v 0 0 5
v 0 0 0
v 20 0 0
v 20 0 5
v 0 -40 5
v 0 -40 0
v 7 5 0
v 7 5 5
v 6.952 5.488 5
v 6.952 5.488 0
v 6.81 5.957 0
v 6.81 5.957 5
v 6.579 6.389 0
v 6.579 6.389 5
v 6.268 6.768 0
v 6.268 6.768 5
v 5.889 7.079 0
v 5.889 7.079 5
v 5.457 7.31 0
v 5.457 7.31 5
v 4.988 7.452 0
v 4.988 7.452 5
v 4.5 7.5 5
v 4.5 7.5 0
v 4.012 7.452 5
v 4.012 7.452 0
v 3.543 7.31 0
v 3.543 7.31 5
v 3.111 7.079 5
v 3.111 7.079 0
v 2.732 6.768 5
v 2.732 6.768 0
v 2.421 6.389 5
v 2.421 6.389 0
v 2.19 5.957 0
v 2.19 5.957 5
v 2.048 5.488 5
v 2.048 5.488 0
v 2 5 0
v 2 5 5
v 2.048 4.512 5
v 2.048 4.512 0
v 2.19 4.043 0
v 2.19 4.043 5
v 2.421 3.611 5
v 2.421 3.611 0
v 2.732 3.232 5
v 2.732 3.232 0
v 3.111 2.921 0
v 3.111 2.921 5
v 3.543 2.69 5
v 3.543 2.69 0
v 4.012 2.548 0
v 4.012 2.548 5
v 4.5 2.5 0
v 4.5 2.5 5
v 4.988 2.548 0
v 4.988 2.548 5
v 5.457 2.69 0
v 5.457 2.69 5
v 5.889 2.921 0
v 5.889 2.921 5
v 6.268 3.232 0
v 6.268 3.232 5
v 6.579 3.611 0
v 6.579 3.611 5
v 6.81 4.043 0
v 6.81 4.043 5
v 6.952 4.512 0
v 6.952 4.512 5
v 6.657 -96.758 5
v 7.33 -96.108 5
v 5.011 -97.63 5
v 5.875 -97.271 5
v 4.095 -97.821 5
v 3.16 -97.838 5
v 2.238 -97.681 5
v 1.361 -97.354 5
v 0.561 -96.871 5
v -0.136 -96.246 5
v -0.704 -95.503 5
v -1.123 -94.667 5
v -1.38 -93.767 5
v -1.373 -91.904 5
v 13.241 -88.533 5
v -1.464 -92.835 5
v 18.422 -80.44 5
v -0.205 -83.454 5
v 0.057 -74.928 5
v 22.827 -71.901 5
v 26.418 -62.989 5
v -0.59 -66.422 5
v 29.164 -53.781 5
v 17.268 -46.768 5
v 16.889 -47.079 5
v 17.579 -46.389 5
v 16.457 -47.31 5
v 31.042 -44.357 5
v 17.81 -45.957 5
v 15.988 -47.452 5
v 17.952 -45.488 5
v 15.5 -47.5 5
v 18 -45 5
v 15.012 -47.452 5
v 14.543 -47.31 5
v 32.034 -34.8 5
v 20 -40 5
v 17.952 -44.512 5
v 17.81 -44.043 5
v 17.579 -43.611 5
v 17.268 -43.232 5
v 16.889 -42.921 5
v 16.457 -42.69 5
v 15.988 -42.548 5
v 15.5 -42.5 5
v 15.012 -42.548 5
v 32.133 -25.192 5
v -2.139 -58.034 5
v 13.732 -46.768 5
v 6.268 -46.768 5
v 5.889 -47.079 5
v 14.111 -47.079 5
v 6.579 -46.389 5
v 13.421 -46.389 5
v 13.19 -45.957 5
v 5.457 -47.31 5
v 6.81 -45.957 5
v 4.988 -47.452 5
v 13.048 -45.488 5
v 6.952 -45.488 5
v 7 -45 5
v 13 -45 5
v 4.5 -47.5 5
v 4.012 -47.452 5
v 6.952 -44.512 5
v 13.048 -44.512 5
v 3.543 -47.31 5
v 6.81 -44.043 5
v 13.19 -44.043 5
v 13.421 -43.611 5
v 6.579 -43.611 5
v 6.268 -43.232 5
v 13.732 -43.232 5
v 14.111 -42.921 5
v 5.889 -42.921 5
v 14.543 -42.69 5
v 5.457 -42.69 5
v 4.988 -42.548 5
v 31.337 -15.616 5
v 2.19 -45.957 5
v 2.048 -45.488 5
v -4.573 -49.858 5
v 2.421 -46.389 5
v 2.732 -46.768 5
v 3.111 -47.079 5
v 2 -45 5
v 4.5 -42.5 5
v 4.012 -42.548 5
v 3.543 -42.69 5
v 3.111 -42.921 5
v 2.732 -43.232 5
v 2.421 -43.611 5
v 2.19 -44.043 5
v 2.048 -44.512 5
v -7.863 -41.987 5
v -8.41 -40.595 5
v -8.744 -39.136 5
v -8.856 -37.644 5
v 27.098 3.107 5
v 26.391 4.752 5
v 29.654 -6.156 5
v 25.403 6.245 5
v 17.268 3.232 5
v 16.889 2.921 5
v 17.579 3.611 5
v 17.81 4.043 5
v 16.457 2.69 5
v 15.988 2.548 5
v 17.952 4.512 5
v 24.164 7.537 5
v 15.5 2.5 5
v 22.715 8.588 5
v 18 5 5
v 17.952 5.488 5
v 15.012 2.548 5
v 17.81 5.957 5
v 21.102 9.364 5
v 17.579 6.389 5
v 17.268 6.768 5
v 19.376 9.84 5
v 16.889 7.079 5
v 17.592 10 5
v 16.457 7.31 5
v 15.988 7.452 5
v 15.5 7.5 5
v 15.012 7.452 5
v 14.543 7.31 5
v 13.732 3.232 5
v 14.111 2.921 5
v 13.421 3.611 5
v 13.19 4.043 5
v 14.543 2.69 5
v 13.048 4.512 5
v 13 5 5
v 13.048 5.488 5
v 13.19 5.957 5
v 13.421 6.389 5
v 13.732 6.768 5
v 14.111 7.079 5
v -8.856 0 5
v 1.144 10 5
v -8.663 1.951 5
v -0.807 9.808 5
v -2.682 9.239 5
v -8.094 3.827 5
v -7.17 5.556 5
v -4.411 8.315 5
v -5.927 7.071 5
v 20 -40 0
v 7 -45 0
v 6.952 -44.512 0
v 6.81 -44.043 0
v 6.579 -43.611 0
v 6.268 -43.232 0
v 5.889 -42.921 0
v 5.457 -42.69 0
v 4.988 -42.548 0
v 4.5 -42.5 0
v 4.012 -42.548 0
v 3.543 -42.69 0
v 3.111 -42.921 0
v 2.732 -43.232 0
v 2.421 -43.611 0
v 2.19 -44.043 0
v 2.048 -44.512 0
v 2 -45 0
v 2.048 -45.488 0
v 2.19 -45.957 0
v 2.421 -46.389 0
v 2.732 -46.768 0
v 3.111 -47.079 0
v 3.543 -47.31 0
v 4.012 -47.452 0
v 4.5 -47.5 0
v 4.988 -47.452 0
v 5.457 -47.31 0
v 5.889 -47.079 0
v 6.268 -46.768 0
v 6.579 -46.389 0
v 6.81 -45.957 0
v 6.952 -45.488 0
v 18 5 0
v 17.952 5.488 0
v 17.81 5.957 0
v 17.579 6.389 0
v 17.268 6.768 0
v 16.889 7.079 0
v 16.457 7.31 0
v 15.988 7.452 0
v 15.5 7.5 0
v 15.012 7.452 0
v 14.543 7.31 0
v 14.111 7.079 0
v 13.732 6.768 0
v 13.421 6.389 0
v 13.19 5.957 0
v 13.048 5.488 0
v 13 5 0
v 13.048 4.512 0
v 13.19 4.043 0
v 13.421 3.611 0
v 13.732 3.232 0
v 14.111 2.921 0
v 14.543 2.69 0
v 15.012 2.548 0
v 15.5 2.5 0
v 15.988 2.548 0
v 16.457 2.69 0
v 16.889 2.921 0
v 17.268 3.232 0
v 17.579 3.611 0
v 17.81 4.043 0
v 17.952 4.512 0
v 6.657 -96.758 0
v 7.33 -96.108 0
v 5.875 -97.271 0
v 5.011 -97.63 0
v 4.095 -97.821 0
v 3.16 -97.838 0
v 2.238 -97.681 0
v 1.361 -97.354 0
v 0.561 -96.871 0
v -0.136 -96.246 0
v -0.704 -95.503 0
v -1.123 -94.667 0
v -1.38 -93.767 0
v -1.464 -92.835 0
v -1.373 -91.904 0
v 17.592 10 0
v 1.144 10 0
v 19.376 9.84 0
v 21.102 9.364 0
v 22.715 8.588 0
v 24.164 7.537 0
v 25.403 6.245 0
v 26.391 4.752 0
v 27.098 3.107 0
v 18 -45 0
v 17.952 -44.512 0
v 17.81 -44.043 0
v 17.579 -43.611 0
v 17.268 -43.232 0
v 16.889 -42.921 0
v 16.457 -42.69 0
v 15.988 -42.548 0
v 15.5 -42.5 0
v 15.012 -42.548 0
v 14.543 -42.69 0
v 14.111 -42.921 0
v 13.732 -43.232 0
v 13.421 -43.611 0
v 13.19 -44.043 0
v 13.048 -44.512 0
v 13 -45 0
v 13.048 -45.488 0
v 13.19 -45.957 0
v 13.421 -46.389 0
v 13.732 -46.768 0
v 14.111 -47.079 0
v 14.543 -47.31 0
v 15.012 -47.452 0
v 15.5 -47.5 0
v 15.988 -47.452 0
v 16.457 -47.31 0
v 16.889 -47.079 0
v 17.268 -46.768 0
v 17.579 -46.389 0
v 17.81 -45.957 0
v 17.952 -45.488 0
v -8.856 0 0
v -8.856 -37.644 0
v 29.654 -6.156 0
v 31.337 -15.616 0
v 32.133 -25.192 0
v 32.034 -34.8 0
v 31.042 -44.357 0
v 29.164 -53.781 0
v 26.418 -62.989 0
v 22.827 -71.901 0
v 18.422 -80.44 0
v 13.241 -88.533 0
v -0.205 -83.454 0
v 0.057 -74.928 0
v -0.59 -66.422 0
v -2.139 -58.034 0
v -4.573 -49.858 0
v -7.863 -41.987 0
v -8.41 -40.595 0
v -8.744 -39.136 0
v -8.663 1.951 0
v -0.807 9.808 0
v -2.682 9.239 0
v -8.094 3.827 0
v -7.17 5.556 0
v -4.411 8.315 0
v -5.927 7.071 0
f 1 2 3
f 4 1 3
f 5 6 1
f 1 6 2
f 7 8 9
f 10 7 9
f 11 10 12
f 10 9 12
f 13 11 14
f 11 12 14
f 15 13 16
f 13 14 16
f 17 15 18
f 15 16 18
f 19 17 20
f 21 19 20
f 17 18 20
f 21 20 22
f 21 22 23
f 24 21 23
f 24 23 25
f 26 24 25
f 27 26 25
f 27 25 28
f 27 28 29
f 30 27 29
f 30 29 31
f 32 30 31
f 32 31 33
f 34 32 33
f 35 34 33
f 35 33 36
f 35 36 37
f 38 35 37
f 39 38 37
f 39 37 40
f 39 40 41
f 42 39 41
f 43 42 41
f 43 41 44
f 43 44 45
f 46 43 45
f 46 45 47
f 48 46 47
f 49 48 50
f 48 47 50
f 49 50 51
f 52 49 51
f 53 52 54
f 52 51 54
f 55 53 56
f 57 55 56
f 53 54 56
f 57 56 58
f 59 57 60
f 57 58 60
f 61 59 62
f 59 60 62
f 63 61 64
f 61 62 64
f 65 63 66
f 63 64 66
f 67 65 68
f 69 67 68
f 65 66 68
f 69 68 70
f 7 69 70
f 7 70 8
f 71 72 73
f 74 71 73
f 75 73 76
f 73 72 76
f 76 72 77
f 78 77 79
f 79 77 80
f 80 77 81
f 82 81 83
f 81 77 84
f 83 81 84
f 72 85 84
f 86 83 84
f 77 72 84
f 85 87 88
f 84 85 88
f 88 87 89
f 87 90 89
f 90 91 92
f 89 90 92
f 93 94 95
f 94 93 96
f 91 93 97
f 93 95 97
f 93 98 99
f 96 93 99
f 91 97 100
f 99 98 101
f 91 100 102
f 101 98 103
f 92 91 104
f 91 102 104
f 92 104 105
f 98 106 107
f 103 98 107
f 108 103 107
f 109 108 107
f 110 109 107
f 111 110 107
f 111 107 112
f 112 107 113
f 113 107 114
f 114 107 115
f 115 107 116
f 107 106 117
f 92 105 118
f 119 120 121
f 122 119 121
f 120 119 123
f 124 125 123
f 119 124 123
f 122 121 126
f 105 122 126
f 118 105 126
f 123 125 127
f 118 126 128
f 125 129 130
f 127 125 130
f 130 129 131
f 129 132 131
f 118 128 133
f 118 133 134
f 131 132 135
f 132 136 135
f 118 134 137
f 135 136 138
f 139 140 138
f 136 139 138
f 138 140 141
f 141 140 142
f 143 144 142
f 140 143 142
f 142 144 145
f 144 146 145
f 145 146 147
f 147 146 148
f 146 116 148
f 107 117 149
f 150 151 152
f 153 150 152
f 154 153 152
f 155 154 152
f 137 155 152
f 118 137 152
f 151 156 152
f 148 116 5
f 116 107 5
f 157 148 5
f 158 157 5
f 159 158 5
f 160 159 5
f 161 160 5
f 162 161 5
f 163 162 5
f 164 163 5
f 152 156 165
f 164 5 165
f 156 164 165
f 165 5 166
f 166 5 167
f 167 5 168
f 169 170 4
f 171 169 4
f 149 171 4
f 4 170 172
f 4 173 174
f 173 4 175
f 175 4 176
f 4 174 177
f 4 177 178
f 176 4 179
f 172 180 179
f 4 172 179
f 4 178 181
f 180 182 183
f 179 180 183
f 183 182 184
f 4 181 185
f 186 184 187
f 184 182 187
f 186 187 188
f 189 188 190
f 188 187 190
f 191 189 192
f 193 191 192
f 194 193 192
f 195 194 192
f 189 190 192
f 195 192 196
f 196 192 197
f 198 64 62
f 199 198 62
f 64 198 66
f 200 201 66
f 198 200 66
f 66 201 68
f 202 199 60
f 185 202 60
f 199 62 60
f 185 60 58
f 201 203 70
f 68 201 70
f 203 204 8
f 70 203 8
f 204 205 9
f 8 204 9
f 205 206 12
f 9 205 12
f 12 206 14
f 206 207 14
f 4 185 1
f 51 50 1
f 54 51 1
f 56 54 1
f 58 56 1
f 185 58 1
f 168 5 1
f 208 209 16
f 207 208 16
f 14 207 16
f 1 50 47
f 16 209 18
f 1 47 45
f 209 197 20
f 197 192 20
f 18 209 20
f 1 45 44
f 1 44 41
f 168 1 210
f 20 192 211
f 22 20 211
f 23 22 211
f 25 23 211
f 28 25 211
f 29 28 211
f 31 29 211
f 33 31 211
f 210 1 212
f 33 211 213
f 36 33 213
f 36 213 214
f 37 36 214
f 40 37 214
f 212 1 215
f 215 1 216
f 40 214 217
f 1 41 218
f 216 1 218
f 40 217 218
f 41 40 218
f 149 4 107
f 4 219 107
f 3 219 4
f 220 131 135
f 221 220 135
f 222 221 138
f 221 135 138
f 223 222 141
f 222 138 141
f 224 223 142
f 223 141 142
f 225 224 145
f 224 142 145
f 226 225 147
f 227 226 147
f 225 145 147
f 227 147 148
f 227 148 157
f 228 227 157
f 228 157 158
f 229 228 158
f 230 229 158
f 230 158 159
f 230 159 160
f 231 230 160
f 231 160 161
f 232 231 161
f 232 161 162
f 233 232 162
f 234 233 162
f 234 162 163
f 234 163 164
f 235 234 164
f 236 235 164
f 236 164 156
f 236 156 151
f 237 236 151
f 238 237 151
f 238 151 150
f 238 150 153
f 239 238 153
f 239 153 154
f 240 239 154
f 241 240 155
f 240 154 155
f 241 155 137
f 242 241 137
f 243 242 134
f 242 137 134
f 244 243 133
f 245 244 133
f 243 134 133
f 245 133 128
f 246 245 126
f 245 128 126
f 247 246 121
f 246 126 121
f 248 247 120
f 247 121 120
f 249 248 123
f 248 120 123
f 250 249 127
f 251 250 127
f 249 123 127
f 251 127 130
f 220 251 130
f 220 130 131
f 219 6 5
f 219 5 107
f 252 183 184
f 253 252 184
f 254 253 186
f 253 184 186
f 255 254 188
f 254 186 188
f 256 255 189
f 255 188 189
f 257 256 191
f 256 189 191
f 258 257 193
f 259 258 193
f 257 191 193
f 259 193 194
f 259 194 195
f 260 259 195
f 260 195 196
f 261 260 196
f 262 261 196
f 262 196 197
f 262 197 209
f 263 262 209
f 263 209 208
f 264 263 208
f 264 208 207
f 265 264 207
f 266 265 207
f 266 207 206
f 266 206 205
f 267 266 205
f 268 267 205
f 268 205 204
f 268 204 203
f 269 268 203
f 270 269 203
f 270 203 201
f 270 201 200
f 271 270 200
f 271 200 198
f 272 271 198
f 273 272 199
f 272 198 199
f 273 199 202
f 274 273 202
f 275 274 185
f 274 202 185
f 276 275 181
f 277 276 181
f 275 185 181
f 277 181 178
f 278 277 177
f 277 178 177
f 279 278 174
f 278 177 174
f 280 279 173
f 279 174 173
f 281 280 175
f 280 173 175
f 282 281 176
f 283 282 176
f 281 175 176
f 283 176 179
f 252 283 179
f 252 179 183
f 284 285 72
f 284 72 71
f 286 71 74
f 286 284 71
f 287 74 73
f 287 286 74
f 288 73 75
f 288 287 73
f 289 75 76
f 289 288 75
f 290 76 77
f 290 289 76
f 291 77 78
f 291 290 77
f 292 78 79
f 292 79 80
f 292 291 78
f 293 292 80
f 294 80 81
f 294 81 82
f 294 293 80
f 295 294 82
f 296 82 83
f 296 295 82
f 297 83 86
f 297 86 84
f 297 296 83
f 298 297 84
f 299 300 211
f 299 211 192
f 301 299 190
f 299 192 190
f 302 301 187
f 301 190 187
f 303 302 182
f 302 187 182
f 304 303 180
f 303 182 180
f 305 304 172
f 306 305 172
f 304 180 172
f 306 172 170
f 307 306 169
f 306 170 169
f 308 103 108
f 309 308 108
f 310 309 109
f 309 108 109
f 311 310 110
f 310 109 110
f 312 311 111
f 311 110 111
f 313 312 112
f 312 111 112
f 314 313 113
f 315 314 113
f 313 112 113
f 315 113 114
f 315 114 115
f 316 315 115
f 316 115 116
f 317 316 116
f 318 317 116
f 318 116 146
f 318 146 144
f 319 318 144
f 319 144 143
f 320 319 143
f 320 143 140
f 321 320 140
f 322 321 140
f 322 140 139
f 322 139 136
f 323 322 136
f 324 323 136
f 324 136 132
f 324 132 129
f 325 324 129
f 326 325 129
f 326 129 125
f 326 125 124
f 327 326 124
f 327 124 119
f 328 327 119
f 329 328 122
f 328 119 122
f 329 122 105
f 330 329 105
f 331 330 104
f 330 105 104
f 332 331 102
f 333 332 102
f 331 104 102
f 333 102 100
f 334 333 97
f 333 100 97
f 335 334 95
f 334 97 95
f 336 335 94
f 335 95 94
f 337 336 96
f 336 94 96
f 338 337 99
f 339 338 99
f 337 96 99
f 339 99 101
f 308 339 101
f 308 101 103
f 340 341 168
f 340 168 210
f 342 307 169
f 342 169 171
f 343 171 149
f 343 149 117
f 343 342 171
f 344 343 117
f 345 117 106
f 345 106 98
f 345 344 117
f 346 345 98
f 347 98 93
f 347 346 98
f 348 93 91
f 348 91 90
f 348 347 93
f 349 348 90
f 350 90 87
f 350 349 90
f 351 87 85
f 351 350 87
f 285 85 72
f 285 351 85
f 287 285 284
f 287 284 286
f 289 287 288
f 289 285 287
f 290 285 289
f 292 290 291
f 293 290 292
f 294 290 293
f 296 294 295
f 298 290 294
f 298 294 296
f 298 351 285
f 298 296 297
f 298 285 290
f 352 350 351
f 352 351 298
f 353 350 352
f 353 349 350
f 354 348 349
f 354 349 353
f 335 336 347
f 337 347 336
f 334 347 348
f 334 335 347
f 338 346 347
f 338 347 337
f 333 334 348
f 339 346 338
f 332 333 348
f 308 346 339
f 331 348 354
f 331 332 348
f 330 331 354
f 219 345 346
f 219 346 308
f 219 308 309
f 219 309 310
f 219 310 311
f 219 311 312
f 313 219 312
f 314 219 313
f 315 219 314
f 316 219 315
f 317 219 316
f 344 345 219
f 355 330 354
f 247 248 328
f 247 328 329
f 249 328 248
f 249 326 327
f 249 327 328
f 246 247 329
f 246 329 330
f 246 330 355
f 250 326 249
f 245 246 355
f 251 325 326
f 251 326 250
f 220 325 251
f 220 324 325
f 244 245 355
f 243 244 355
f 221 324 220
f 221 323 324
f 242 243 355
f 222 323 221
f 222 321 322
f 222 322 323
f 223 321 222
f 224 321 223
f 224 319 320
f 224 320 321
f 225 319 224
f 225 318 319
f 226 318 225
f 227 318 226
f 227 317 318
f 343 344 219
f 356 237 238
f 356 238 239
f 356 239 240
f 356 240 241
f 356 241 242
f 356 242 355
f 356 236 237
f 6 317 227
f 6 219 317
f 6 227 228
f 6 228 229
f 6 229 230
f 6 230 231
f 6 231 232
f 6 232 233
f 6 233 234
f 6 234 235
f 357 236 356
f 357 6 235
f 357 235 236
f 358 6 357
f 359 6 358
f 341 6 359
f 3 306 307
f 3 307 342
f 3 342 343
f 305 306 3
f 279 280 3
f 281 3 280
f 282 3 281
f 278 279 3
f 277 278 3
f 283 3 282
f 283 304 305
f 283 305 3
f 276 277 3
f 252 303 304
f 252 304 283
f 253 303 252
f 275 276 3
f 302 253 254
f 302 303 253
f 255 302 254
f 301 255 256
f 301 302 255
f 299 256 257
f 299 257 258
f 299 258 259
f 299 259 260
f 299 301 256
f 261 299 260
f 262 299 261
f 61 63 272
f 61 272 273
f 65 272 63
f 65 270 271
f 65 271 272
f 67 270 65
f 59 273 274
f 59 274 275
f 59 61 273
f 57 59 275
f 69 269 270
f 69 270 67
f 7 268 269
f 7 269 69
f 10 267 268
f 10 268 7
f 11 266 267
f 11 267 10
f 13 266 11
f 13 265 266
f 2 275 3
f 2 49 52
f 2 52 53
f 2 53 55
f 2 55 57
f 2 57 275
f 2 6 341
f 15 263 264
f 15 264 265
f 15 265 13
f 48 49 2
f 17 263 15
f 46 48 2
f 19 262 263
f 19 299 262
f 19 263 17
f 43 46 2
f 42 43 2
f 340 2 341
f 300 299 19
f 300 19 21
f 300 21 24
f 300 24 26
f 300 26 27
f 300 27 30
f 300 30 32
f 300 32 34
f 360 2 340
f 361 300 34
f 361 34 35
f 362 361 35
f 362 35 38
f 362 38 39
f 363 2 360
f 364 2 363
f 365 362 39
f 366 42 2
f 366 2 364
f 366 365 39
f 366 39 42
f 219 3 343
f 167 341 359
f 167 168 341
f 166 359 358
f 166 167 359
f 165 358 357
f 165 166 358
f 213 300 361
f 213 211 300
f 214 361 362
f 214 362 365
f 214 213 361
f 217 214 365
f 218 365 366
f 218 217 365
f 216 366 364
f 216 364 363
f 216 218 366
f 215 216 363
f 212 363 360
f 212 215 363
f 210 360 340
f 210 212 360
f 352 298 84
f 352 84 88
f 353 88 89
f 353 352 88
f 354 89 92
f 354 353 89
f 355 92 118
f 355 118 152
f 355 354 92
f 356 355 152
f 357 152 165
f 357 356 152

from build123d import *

# Parameters (mm, degrees)
ESQUISSE1_W             = 20
ESQUISSE1_H             = 40
BOSS_EXTRU_1_DEPTH      = 5
CONG_1_R                = 10
CONG_2_R                = 10
ESQUISSE2_R             = 2.5
ENL_V_MAT_EXTRU_1_DEPTH = 10


with BuildPart() as part:
    # Esquisse1 → Boss.-Extru.1 (new body)
    with BuildSketch(Plane.XY):
        with BuildLine():
            Line((-8.855638783, 10), (24.569838787, 10))
            ThreePointArc((24.569838787, 10), (30.866124306, -45.477583457), (7.330413731, -96.108362687))
            ThreePointArc((7.330413731, -96.108362687), (1.361276776, -97.354484204), (-1.373289466, -91.904203266))
            ThreePointArc((-1.373289466, -91.904203266), (-0.740706025, -65.321594201), (-8.855638783, -40))
            Line((-8.855638783, -40), (-8.855638783, 10))
        make_face()
        with Locations((10, -20)):
            Rectangle(ESQUISSE1_W, ESQUISSE1_H, mode=Mode.SUBTRACT)
    extrude(amount=BOSS_EXTRU_1_DEPTH)

    # Congé1
    cong_1_edges = [part.edges().sort_by_distance(p)[0] for p in [
        (24.569838787, 10, 2.5),
    ]]
    fillet(cong_1_edges, radius=CONG_1_R)

    # Congé2
    cong_2_edges = [part.edges().sort_by_distance(p)[0] for p in [
        (-8.855638783, -40, 2.5),
        (-8.855638783, 10, 2.5),
    ]]
    fillet(cong_2_edges, radius=CONG_2_R)

    # Esquisse2 → Enlèv. mat.-Extru.1 (cut)
    with BuildSketch(Plane.XY.offset(5)):
        with Locations((4.5, 5)):
            Circle(ESQUISSE2_R)
        with Locations((15.5, 5)):
            Circle(ESQUISSE2_R)
        with Locations((4.5, -45)):
            Circle(ESQUISSE2_R)
        with Locations((15.5, -45)):
            Circle(ESQUISSE2_R)
    extrude(amount=-ENL_V_MAT_EXTRU_1_DEPTH, mode=Mode.SUBTRACT)


solid = part.part
